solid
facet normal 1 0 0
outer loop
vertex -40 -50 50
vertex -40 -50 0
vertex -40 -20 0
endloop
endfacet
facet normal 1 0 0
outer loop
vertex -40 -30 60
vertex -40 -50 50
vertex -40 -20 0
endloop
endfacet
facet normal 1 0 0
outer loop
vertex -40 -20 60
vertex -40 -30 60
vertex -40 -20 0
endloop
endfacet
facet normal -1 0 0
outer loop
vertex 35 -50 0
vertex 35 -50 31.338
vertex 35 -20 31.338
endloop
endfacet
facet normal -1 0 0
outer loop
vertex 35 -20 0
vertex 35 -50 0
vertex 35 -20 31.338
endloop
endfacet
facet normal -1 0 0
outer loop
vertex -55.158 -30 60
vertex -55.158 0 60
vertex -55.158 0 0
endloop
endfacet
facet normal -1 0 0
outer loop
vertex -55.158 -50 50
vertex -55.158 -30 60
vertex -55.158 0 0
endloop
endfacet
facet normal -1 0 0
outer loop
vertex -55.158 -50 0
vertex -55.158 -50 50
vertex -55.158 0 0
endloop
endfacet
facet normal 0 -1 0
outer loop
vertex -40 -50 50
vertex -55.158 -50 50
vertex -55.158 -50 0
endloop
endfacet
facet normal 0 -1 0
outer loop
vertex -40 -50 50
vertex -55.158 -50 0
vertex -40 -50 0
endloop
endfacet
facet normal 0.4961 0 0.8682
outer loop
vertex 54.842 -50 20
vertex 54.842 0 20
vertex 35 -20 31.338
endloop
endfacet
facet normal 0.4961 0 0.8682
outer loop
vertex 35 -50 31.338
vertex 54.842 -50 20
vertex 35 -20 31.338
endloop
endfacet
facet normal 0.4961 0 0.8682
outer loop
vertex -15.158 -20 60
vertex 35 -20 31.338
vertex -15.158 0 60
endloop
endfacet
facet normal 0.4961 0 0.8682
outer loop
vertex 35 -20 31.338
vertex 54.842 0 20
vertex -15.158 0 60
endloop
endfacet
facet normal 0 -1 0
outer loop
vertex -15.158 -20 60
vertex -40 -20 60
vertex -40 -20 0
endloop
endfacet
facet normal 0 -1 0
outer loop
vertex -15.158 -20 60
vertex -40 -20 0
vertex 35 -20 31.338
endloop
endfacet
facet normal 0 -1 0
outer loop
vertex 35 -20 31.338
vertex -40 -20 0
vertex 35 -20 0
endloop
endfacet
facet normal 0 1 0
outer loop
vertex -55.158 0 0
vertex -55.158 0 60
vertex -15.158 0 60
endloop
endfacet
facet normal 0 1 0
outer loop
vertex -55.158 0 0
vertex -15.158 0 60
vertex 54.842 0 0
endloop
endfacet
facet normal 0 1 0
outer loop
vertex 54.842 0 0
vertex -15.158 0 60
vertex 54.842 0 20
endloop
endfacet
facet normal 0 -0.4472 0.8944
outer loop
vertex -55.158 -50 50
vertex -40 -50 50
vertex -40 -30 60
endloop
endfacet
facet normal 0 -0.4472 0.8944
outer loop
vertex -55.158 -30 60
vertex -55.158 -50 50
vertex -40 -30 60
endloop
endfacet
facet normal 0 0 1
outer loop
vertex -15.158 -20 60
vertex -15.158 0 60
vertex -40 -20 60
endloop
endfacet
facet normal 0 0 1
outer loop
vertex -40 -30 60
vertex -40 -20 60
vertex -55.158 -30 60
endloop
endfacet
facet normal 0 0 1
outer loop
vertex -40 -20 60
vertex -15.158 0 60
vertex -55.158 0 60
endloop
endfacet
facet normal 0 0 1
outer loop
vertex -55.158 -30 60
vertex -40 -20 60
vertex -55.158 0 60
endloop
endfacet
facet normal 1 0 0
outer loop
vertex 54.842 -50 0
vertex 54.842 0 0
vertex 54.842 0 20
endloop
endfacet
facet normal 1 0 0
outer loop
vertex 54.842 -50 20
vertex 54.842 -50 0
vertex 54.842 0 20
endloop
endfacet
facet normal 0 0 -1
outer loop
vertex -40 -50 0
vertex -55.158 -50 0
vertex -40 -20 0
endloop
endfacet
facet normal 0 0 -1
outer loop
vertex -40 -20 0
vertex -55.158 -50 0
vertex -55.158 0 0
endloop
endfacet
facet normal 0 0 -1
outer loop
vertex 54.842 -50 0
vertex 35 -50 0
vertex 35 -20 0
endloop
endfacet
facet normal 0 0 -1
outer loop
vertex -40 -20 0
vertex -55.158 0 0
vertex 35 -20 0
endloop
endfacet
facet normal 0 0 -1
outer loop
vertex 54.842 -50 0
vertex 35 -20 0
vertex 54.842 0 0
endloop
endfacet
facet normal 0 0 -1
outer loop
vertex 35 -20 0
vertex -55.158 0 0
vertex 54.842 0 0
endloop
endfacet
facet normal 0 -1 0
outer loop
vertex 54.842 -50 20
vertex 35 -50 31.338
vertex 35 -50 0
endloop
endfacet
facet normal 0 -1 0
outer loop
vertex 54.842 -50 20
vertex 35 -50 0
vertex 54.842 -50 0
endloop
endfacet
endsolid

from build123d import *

# Parameters (mm, degrees)
F1_DEPTH = 50
F2_W     = 75
F2_H     = 30
F3_DEPTH = 60
F5_DEPTH = 56


with BuildPart() as f1:
    # F0 (on Front) → F1 (new body)
    with BuildSketch(Plane.XZ):
        Polygon((-55.158045, 60), (-55.158045, 0), (54.841955, 0), (54.841955, 20), (-15.158045, 60), align=None)
    extrude(amount=F1_DEPTH)

    # F2 (on Top) → F3 (cut)
    with BuildSketch(Plane.XY):
        with Locations((-2.5, -35)):
            Rectangle(F2_W, F2_H)
    extrude(amount=F3_DEPTH, mode=Mode.SUBTRACT)

    # F4 (on Right) → F5 (cut, symmetric)
    with BuildSketch(Plane.YZ):
        Polygon((-50, 50), (-30, 60), (-50, 60), align=None)
    extrude(amount=F5_DEPTH, both=True, mode=Mode.SUBTRACT)


solid = f1.part
